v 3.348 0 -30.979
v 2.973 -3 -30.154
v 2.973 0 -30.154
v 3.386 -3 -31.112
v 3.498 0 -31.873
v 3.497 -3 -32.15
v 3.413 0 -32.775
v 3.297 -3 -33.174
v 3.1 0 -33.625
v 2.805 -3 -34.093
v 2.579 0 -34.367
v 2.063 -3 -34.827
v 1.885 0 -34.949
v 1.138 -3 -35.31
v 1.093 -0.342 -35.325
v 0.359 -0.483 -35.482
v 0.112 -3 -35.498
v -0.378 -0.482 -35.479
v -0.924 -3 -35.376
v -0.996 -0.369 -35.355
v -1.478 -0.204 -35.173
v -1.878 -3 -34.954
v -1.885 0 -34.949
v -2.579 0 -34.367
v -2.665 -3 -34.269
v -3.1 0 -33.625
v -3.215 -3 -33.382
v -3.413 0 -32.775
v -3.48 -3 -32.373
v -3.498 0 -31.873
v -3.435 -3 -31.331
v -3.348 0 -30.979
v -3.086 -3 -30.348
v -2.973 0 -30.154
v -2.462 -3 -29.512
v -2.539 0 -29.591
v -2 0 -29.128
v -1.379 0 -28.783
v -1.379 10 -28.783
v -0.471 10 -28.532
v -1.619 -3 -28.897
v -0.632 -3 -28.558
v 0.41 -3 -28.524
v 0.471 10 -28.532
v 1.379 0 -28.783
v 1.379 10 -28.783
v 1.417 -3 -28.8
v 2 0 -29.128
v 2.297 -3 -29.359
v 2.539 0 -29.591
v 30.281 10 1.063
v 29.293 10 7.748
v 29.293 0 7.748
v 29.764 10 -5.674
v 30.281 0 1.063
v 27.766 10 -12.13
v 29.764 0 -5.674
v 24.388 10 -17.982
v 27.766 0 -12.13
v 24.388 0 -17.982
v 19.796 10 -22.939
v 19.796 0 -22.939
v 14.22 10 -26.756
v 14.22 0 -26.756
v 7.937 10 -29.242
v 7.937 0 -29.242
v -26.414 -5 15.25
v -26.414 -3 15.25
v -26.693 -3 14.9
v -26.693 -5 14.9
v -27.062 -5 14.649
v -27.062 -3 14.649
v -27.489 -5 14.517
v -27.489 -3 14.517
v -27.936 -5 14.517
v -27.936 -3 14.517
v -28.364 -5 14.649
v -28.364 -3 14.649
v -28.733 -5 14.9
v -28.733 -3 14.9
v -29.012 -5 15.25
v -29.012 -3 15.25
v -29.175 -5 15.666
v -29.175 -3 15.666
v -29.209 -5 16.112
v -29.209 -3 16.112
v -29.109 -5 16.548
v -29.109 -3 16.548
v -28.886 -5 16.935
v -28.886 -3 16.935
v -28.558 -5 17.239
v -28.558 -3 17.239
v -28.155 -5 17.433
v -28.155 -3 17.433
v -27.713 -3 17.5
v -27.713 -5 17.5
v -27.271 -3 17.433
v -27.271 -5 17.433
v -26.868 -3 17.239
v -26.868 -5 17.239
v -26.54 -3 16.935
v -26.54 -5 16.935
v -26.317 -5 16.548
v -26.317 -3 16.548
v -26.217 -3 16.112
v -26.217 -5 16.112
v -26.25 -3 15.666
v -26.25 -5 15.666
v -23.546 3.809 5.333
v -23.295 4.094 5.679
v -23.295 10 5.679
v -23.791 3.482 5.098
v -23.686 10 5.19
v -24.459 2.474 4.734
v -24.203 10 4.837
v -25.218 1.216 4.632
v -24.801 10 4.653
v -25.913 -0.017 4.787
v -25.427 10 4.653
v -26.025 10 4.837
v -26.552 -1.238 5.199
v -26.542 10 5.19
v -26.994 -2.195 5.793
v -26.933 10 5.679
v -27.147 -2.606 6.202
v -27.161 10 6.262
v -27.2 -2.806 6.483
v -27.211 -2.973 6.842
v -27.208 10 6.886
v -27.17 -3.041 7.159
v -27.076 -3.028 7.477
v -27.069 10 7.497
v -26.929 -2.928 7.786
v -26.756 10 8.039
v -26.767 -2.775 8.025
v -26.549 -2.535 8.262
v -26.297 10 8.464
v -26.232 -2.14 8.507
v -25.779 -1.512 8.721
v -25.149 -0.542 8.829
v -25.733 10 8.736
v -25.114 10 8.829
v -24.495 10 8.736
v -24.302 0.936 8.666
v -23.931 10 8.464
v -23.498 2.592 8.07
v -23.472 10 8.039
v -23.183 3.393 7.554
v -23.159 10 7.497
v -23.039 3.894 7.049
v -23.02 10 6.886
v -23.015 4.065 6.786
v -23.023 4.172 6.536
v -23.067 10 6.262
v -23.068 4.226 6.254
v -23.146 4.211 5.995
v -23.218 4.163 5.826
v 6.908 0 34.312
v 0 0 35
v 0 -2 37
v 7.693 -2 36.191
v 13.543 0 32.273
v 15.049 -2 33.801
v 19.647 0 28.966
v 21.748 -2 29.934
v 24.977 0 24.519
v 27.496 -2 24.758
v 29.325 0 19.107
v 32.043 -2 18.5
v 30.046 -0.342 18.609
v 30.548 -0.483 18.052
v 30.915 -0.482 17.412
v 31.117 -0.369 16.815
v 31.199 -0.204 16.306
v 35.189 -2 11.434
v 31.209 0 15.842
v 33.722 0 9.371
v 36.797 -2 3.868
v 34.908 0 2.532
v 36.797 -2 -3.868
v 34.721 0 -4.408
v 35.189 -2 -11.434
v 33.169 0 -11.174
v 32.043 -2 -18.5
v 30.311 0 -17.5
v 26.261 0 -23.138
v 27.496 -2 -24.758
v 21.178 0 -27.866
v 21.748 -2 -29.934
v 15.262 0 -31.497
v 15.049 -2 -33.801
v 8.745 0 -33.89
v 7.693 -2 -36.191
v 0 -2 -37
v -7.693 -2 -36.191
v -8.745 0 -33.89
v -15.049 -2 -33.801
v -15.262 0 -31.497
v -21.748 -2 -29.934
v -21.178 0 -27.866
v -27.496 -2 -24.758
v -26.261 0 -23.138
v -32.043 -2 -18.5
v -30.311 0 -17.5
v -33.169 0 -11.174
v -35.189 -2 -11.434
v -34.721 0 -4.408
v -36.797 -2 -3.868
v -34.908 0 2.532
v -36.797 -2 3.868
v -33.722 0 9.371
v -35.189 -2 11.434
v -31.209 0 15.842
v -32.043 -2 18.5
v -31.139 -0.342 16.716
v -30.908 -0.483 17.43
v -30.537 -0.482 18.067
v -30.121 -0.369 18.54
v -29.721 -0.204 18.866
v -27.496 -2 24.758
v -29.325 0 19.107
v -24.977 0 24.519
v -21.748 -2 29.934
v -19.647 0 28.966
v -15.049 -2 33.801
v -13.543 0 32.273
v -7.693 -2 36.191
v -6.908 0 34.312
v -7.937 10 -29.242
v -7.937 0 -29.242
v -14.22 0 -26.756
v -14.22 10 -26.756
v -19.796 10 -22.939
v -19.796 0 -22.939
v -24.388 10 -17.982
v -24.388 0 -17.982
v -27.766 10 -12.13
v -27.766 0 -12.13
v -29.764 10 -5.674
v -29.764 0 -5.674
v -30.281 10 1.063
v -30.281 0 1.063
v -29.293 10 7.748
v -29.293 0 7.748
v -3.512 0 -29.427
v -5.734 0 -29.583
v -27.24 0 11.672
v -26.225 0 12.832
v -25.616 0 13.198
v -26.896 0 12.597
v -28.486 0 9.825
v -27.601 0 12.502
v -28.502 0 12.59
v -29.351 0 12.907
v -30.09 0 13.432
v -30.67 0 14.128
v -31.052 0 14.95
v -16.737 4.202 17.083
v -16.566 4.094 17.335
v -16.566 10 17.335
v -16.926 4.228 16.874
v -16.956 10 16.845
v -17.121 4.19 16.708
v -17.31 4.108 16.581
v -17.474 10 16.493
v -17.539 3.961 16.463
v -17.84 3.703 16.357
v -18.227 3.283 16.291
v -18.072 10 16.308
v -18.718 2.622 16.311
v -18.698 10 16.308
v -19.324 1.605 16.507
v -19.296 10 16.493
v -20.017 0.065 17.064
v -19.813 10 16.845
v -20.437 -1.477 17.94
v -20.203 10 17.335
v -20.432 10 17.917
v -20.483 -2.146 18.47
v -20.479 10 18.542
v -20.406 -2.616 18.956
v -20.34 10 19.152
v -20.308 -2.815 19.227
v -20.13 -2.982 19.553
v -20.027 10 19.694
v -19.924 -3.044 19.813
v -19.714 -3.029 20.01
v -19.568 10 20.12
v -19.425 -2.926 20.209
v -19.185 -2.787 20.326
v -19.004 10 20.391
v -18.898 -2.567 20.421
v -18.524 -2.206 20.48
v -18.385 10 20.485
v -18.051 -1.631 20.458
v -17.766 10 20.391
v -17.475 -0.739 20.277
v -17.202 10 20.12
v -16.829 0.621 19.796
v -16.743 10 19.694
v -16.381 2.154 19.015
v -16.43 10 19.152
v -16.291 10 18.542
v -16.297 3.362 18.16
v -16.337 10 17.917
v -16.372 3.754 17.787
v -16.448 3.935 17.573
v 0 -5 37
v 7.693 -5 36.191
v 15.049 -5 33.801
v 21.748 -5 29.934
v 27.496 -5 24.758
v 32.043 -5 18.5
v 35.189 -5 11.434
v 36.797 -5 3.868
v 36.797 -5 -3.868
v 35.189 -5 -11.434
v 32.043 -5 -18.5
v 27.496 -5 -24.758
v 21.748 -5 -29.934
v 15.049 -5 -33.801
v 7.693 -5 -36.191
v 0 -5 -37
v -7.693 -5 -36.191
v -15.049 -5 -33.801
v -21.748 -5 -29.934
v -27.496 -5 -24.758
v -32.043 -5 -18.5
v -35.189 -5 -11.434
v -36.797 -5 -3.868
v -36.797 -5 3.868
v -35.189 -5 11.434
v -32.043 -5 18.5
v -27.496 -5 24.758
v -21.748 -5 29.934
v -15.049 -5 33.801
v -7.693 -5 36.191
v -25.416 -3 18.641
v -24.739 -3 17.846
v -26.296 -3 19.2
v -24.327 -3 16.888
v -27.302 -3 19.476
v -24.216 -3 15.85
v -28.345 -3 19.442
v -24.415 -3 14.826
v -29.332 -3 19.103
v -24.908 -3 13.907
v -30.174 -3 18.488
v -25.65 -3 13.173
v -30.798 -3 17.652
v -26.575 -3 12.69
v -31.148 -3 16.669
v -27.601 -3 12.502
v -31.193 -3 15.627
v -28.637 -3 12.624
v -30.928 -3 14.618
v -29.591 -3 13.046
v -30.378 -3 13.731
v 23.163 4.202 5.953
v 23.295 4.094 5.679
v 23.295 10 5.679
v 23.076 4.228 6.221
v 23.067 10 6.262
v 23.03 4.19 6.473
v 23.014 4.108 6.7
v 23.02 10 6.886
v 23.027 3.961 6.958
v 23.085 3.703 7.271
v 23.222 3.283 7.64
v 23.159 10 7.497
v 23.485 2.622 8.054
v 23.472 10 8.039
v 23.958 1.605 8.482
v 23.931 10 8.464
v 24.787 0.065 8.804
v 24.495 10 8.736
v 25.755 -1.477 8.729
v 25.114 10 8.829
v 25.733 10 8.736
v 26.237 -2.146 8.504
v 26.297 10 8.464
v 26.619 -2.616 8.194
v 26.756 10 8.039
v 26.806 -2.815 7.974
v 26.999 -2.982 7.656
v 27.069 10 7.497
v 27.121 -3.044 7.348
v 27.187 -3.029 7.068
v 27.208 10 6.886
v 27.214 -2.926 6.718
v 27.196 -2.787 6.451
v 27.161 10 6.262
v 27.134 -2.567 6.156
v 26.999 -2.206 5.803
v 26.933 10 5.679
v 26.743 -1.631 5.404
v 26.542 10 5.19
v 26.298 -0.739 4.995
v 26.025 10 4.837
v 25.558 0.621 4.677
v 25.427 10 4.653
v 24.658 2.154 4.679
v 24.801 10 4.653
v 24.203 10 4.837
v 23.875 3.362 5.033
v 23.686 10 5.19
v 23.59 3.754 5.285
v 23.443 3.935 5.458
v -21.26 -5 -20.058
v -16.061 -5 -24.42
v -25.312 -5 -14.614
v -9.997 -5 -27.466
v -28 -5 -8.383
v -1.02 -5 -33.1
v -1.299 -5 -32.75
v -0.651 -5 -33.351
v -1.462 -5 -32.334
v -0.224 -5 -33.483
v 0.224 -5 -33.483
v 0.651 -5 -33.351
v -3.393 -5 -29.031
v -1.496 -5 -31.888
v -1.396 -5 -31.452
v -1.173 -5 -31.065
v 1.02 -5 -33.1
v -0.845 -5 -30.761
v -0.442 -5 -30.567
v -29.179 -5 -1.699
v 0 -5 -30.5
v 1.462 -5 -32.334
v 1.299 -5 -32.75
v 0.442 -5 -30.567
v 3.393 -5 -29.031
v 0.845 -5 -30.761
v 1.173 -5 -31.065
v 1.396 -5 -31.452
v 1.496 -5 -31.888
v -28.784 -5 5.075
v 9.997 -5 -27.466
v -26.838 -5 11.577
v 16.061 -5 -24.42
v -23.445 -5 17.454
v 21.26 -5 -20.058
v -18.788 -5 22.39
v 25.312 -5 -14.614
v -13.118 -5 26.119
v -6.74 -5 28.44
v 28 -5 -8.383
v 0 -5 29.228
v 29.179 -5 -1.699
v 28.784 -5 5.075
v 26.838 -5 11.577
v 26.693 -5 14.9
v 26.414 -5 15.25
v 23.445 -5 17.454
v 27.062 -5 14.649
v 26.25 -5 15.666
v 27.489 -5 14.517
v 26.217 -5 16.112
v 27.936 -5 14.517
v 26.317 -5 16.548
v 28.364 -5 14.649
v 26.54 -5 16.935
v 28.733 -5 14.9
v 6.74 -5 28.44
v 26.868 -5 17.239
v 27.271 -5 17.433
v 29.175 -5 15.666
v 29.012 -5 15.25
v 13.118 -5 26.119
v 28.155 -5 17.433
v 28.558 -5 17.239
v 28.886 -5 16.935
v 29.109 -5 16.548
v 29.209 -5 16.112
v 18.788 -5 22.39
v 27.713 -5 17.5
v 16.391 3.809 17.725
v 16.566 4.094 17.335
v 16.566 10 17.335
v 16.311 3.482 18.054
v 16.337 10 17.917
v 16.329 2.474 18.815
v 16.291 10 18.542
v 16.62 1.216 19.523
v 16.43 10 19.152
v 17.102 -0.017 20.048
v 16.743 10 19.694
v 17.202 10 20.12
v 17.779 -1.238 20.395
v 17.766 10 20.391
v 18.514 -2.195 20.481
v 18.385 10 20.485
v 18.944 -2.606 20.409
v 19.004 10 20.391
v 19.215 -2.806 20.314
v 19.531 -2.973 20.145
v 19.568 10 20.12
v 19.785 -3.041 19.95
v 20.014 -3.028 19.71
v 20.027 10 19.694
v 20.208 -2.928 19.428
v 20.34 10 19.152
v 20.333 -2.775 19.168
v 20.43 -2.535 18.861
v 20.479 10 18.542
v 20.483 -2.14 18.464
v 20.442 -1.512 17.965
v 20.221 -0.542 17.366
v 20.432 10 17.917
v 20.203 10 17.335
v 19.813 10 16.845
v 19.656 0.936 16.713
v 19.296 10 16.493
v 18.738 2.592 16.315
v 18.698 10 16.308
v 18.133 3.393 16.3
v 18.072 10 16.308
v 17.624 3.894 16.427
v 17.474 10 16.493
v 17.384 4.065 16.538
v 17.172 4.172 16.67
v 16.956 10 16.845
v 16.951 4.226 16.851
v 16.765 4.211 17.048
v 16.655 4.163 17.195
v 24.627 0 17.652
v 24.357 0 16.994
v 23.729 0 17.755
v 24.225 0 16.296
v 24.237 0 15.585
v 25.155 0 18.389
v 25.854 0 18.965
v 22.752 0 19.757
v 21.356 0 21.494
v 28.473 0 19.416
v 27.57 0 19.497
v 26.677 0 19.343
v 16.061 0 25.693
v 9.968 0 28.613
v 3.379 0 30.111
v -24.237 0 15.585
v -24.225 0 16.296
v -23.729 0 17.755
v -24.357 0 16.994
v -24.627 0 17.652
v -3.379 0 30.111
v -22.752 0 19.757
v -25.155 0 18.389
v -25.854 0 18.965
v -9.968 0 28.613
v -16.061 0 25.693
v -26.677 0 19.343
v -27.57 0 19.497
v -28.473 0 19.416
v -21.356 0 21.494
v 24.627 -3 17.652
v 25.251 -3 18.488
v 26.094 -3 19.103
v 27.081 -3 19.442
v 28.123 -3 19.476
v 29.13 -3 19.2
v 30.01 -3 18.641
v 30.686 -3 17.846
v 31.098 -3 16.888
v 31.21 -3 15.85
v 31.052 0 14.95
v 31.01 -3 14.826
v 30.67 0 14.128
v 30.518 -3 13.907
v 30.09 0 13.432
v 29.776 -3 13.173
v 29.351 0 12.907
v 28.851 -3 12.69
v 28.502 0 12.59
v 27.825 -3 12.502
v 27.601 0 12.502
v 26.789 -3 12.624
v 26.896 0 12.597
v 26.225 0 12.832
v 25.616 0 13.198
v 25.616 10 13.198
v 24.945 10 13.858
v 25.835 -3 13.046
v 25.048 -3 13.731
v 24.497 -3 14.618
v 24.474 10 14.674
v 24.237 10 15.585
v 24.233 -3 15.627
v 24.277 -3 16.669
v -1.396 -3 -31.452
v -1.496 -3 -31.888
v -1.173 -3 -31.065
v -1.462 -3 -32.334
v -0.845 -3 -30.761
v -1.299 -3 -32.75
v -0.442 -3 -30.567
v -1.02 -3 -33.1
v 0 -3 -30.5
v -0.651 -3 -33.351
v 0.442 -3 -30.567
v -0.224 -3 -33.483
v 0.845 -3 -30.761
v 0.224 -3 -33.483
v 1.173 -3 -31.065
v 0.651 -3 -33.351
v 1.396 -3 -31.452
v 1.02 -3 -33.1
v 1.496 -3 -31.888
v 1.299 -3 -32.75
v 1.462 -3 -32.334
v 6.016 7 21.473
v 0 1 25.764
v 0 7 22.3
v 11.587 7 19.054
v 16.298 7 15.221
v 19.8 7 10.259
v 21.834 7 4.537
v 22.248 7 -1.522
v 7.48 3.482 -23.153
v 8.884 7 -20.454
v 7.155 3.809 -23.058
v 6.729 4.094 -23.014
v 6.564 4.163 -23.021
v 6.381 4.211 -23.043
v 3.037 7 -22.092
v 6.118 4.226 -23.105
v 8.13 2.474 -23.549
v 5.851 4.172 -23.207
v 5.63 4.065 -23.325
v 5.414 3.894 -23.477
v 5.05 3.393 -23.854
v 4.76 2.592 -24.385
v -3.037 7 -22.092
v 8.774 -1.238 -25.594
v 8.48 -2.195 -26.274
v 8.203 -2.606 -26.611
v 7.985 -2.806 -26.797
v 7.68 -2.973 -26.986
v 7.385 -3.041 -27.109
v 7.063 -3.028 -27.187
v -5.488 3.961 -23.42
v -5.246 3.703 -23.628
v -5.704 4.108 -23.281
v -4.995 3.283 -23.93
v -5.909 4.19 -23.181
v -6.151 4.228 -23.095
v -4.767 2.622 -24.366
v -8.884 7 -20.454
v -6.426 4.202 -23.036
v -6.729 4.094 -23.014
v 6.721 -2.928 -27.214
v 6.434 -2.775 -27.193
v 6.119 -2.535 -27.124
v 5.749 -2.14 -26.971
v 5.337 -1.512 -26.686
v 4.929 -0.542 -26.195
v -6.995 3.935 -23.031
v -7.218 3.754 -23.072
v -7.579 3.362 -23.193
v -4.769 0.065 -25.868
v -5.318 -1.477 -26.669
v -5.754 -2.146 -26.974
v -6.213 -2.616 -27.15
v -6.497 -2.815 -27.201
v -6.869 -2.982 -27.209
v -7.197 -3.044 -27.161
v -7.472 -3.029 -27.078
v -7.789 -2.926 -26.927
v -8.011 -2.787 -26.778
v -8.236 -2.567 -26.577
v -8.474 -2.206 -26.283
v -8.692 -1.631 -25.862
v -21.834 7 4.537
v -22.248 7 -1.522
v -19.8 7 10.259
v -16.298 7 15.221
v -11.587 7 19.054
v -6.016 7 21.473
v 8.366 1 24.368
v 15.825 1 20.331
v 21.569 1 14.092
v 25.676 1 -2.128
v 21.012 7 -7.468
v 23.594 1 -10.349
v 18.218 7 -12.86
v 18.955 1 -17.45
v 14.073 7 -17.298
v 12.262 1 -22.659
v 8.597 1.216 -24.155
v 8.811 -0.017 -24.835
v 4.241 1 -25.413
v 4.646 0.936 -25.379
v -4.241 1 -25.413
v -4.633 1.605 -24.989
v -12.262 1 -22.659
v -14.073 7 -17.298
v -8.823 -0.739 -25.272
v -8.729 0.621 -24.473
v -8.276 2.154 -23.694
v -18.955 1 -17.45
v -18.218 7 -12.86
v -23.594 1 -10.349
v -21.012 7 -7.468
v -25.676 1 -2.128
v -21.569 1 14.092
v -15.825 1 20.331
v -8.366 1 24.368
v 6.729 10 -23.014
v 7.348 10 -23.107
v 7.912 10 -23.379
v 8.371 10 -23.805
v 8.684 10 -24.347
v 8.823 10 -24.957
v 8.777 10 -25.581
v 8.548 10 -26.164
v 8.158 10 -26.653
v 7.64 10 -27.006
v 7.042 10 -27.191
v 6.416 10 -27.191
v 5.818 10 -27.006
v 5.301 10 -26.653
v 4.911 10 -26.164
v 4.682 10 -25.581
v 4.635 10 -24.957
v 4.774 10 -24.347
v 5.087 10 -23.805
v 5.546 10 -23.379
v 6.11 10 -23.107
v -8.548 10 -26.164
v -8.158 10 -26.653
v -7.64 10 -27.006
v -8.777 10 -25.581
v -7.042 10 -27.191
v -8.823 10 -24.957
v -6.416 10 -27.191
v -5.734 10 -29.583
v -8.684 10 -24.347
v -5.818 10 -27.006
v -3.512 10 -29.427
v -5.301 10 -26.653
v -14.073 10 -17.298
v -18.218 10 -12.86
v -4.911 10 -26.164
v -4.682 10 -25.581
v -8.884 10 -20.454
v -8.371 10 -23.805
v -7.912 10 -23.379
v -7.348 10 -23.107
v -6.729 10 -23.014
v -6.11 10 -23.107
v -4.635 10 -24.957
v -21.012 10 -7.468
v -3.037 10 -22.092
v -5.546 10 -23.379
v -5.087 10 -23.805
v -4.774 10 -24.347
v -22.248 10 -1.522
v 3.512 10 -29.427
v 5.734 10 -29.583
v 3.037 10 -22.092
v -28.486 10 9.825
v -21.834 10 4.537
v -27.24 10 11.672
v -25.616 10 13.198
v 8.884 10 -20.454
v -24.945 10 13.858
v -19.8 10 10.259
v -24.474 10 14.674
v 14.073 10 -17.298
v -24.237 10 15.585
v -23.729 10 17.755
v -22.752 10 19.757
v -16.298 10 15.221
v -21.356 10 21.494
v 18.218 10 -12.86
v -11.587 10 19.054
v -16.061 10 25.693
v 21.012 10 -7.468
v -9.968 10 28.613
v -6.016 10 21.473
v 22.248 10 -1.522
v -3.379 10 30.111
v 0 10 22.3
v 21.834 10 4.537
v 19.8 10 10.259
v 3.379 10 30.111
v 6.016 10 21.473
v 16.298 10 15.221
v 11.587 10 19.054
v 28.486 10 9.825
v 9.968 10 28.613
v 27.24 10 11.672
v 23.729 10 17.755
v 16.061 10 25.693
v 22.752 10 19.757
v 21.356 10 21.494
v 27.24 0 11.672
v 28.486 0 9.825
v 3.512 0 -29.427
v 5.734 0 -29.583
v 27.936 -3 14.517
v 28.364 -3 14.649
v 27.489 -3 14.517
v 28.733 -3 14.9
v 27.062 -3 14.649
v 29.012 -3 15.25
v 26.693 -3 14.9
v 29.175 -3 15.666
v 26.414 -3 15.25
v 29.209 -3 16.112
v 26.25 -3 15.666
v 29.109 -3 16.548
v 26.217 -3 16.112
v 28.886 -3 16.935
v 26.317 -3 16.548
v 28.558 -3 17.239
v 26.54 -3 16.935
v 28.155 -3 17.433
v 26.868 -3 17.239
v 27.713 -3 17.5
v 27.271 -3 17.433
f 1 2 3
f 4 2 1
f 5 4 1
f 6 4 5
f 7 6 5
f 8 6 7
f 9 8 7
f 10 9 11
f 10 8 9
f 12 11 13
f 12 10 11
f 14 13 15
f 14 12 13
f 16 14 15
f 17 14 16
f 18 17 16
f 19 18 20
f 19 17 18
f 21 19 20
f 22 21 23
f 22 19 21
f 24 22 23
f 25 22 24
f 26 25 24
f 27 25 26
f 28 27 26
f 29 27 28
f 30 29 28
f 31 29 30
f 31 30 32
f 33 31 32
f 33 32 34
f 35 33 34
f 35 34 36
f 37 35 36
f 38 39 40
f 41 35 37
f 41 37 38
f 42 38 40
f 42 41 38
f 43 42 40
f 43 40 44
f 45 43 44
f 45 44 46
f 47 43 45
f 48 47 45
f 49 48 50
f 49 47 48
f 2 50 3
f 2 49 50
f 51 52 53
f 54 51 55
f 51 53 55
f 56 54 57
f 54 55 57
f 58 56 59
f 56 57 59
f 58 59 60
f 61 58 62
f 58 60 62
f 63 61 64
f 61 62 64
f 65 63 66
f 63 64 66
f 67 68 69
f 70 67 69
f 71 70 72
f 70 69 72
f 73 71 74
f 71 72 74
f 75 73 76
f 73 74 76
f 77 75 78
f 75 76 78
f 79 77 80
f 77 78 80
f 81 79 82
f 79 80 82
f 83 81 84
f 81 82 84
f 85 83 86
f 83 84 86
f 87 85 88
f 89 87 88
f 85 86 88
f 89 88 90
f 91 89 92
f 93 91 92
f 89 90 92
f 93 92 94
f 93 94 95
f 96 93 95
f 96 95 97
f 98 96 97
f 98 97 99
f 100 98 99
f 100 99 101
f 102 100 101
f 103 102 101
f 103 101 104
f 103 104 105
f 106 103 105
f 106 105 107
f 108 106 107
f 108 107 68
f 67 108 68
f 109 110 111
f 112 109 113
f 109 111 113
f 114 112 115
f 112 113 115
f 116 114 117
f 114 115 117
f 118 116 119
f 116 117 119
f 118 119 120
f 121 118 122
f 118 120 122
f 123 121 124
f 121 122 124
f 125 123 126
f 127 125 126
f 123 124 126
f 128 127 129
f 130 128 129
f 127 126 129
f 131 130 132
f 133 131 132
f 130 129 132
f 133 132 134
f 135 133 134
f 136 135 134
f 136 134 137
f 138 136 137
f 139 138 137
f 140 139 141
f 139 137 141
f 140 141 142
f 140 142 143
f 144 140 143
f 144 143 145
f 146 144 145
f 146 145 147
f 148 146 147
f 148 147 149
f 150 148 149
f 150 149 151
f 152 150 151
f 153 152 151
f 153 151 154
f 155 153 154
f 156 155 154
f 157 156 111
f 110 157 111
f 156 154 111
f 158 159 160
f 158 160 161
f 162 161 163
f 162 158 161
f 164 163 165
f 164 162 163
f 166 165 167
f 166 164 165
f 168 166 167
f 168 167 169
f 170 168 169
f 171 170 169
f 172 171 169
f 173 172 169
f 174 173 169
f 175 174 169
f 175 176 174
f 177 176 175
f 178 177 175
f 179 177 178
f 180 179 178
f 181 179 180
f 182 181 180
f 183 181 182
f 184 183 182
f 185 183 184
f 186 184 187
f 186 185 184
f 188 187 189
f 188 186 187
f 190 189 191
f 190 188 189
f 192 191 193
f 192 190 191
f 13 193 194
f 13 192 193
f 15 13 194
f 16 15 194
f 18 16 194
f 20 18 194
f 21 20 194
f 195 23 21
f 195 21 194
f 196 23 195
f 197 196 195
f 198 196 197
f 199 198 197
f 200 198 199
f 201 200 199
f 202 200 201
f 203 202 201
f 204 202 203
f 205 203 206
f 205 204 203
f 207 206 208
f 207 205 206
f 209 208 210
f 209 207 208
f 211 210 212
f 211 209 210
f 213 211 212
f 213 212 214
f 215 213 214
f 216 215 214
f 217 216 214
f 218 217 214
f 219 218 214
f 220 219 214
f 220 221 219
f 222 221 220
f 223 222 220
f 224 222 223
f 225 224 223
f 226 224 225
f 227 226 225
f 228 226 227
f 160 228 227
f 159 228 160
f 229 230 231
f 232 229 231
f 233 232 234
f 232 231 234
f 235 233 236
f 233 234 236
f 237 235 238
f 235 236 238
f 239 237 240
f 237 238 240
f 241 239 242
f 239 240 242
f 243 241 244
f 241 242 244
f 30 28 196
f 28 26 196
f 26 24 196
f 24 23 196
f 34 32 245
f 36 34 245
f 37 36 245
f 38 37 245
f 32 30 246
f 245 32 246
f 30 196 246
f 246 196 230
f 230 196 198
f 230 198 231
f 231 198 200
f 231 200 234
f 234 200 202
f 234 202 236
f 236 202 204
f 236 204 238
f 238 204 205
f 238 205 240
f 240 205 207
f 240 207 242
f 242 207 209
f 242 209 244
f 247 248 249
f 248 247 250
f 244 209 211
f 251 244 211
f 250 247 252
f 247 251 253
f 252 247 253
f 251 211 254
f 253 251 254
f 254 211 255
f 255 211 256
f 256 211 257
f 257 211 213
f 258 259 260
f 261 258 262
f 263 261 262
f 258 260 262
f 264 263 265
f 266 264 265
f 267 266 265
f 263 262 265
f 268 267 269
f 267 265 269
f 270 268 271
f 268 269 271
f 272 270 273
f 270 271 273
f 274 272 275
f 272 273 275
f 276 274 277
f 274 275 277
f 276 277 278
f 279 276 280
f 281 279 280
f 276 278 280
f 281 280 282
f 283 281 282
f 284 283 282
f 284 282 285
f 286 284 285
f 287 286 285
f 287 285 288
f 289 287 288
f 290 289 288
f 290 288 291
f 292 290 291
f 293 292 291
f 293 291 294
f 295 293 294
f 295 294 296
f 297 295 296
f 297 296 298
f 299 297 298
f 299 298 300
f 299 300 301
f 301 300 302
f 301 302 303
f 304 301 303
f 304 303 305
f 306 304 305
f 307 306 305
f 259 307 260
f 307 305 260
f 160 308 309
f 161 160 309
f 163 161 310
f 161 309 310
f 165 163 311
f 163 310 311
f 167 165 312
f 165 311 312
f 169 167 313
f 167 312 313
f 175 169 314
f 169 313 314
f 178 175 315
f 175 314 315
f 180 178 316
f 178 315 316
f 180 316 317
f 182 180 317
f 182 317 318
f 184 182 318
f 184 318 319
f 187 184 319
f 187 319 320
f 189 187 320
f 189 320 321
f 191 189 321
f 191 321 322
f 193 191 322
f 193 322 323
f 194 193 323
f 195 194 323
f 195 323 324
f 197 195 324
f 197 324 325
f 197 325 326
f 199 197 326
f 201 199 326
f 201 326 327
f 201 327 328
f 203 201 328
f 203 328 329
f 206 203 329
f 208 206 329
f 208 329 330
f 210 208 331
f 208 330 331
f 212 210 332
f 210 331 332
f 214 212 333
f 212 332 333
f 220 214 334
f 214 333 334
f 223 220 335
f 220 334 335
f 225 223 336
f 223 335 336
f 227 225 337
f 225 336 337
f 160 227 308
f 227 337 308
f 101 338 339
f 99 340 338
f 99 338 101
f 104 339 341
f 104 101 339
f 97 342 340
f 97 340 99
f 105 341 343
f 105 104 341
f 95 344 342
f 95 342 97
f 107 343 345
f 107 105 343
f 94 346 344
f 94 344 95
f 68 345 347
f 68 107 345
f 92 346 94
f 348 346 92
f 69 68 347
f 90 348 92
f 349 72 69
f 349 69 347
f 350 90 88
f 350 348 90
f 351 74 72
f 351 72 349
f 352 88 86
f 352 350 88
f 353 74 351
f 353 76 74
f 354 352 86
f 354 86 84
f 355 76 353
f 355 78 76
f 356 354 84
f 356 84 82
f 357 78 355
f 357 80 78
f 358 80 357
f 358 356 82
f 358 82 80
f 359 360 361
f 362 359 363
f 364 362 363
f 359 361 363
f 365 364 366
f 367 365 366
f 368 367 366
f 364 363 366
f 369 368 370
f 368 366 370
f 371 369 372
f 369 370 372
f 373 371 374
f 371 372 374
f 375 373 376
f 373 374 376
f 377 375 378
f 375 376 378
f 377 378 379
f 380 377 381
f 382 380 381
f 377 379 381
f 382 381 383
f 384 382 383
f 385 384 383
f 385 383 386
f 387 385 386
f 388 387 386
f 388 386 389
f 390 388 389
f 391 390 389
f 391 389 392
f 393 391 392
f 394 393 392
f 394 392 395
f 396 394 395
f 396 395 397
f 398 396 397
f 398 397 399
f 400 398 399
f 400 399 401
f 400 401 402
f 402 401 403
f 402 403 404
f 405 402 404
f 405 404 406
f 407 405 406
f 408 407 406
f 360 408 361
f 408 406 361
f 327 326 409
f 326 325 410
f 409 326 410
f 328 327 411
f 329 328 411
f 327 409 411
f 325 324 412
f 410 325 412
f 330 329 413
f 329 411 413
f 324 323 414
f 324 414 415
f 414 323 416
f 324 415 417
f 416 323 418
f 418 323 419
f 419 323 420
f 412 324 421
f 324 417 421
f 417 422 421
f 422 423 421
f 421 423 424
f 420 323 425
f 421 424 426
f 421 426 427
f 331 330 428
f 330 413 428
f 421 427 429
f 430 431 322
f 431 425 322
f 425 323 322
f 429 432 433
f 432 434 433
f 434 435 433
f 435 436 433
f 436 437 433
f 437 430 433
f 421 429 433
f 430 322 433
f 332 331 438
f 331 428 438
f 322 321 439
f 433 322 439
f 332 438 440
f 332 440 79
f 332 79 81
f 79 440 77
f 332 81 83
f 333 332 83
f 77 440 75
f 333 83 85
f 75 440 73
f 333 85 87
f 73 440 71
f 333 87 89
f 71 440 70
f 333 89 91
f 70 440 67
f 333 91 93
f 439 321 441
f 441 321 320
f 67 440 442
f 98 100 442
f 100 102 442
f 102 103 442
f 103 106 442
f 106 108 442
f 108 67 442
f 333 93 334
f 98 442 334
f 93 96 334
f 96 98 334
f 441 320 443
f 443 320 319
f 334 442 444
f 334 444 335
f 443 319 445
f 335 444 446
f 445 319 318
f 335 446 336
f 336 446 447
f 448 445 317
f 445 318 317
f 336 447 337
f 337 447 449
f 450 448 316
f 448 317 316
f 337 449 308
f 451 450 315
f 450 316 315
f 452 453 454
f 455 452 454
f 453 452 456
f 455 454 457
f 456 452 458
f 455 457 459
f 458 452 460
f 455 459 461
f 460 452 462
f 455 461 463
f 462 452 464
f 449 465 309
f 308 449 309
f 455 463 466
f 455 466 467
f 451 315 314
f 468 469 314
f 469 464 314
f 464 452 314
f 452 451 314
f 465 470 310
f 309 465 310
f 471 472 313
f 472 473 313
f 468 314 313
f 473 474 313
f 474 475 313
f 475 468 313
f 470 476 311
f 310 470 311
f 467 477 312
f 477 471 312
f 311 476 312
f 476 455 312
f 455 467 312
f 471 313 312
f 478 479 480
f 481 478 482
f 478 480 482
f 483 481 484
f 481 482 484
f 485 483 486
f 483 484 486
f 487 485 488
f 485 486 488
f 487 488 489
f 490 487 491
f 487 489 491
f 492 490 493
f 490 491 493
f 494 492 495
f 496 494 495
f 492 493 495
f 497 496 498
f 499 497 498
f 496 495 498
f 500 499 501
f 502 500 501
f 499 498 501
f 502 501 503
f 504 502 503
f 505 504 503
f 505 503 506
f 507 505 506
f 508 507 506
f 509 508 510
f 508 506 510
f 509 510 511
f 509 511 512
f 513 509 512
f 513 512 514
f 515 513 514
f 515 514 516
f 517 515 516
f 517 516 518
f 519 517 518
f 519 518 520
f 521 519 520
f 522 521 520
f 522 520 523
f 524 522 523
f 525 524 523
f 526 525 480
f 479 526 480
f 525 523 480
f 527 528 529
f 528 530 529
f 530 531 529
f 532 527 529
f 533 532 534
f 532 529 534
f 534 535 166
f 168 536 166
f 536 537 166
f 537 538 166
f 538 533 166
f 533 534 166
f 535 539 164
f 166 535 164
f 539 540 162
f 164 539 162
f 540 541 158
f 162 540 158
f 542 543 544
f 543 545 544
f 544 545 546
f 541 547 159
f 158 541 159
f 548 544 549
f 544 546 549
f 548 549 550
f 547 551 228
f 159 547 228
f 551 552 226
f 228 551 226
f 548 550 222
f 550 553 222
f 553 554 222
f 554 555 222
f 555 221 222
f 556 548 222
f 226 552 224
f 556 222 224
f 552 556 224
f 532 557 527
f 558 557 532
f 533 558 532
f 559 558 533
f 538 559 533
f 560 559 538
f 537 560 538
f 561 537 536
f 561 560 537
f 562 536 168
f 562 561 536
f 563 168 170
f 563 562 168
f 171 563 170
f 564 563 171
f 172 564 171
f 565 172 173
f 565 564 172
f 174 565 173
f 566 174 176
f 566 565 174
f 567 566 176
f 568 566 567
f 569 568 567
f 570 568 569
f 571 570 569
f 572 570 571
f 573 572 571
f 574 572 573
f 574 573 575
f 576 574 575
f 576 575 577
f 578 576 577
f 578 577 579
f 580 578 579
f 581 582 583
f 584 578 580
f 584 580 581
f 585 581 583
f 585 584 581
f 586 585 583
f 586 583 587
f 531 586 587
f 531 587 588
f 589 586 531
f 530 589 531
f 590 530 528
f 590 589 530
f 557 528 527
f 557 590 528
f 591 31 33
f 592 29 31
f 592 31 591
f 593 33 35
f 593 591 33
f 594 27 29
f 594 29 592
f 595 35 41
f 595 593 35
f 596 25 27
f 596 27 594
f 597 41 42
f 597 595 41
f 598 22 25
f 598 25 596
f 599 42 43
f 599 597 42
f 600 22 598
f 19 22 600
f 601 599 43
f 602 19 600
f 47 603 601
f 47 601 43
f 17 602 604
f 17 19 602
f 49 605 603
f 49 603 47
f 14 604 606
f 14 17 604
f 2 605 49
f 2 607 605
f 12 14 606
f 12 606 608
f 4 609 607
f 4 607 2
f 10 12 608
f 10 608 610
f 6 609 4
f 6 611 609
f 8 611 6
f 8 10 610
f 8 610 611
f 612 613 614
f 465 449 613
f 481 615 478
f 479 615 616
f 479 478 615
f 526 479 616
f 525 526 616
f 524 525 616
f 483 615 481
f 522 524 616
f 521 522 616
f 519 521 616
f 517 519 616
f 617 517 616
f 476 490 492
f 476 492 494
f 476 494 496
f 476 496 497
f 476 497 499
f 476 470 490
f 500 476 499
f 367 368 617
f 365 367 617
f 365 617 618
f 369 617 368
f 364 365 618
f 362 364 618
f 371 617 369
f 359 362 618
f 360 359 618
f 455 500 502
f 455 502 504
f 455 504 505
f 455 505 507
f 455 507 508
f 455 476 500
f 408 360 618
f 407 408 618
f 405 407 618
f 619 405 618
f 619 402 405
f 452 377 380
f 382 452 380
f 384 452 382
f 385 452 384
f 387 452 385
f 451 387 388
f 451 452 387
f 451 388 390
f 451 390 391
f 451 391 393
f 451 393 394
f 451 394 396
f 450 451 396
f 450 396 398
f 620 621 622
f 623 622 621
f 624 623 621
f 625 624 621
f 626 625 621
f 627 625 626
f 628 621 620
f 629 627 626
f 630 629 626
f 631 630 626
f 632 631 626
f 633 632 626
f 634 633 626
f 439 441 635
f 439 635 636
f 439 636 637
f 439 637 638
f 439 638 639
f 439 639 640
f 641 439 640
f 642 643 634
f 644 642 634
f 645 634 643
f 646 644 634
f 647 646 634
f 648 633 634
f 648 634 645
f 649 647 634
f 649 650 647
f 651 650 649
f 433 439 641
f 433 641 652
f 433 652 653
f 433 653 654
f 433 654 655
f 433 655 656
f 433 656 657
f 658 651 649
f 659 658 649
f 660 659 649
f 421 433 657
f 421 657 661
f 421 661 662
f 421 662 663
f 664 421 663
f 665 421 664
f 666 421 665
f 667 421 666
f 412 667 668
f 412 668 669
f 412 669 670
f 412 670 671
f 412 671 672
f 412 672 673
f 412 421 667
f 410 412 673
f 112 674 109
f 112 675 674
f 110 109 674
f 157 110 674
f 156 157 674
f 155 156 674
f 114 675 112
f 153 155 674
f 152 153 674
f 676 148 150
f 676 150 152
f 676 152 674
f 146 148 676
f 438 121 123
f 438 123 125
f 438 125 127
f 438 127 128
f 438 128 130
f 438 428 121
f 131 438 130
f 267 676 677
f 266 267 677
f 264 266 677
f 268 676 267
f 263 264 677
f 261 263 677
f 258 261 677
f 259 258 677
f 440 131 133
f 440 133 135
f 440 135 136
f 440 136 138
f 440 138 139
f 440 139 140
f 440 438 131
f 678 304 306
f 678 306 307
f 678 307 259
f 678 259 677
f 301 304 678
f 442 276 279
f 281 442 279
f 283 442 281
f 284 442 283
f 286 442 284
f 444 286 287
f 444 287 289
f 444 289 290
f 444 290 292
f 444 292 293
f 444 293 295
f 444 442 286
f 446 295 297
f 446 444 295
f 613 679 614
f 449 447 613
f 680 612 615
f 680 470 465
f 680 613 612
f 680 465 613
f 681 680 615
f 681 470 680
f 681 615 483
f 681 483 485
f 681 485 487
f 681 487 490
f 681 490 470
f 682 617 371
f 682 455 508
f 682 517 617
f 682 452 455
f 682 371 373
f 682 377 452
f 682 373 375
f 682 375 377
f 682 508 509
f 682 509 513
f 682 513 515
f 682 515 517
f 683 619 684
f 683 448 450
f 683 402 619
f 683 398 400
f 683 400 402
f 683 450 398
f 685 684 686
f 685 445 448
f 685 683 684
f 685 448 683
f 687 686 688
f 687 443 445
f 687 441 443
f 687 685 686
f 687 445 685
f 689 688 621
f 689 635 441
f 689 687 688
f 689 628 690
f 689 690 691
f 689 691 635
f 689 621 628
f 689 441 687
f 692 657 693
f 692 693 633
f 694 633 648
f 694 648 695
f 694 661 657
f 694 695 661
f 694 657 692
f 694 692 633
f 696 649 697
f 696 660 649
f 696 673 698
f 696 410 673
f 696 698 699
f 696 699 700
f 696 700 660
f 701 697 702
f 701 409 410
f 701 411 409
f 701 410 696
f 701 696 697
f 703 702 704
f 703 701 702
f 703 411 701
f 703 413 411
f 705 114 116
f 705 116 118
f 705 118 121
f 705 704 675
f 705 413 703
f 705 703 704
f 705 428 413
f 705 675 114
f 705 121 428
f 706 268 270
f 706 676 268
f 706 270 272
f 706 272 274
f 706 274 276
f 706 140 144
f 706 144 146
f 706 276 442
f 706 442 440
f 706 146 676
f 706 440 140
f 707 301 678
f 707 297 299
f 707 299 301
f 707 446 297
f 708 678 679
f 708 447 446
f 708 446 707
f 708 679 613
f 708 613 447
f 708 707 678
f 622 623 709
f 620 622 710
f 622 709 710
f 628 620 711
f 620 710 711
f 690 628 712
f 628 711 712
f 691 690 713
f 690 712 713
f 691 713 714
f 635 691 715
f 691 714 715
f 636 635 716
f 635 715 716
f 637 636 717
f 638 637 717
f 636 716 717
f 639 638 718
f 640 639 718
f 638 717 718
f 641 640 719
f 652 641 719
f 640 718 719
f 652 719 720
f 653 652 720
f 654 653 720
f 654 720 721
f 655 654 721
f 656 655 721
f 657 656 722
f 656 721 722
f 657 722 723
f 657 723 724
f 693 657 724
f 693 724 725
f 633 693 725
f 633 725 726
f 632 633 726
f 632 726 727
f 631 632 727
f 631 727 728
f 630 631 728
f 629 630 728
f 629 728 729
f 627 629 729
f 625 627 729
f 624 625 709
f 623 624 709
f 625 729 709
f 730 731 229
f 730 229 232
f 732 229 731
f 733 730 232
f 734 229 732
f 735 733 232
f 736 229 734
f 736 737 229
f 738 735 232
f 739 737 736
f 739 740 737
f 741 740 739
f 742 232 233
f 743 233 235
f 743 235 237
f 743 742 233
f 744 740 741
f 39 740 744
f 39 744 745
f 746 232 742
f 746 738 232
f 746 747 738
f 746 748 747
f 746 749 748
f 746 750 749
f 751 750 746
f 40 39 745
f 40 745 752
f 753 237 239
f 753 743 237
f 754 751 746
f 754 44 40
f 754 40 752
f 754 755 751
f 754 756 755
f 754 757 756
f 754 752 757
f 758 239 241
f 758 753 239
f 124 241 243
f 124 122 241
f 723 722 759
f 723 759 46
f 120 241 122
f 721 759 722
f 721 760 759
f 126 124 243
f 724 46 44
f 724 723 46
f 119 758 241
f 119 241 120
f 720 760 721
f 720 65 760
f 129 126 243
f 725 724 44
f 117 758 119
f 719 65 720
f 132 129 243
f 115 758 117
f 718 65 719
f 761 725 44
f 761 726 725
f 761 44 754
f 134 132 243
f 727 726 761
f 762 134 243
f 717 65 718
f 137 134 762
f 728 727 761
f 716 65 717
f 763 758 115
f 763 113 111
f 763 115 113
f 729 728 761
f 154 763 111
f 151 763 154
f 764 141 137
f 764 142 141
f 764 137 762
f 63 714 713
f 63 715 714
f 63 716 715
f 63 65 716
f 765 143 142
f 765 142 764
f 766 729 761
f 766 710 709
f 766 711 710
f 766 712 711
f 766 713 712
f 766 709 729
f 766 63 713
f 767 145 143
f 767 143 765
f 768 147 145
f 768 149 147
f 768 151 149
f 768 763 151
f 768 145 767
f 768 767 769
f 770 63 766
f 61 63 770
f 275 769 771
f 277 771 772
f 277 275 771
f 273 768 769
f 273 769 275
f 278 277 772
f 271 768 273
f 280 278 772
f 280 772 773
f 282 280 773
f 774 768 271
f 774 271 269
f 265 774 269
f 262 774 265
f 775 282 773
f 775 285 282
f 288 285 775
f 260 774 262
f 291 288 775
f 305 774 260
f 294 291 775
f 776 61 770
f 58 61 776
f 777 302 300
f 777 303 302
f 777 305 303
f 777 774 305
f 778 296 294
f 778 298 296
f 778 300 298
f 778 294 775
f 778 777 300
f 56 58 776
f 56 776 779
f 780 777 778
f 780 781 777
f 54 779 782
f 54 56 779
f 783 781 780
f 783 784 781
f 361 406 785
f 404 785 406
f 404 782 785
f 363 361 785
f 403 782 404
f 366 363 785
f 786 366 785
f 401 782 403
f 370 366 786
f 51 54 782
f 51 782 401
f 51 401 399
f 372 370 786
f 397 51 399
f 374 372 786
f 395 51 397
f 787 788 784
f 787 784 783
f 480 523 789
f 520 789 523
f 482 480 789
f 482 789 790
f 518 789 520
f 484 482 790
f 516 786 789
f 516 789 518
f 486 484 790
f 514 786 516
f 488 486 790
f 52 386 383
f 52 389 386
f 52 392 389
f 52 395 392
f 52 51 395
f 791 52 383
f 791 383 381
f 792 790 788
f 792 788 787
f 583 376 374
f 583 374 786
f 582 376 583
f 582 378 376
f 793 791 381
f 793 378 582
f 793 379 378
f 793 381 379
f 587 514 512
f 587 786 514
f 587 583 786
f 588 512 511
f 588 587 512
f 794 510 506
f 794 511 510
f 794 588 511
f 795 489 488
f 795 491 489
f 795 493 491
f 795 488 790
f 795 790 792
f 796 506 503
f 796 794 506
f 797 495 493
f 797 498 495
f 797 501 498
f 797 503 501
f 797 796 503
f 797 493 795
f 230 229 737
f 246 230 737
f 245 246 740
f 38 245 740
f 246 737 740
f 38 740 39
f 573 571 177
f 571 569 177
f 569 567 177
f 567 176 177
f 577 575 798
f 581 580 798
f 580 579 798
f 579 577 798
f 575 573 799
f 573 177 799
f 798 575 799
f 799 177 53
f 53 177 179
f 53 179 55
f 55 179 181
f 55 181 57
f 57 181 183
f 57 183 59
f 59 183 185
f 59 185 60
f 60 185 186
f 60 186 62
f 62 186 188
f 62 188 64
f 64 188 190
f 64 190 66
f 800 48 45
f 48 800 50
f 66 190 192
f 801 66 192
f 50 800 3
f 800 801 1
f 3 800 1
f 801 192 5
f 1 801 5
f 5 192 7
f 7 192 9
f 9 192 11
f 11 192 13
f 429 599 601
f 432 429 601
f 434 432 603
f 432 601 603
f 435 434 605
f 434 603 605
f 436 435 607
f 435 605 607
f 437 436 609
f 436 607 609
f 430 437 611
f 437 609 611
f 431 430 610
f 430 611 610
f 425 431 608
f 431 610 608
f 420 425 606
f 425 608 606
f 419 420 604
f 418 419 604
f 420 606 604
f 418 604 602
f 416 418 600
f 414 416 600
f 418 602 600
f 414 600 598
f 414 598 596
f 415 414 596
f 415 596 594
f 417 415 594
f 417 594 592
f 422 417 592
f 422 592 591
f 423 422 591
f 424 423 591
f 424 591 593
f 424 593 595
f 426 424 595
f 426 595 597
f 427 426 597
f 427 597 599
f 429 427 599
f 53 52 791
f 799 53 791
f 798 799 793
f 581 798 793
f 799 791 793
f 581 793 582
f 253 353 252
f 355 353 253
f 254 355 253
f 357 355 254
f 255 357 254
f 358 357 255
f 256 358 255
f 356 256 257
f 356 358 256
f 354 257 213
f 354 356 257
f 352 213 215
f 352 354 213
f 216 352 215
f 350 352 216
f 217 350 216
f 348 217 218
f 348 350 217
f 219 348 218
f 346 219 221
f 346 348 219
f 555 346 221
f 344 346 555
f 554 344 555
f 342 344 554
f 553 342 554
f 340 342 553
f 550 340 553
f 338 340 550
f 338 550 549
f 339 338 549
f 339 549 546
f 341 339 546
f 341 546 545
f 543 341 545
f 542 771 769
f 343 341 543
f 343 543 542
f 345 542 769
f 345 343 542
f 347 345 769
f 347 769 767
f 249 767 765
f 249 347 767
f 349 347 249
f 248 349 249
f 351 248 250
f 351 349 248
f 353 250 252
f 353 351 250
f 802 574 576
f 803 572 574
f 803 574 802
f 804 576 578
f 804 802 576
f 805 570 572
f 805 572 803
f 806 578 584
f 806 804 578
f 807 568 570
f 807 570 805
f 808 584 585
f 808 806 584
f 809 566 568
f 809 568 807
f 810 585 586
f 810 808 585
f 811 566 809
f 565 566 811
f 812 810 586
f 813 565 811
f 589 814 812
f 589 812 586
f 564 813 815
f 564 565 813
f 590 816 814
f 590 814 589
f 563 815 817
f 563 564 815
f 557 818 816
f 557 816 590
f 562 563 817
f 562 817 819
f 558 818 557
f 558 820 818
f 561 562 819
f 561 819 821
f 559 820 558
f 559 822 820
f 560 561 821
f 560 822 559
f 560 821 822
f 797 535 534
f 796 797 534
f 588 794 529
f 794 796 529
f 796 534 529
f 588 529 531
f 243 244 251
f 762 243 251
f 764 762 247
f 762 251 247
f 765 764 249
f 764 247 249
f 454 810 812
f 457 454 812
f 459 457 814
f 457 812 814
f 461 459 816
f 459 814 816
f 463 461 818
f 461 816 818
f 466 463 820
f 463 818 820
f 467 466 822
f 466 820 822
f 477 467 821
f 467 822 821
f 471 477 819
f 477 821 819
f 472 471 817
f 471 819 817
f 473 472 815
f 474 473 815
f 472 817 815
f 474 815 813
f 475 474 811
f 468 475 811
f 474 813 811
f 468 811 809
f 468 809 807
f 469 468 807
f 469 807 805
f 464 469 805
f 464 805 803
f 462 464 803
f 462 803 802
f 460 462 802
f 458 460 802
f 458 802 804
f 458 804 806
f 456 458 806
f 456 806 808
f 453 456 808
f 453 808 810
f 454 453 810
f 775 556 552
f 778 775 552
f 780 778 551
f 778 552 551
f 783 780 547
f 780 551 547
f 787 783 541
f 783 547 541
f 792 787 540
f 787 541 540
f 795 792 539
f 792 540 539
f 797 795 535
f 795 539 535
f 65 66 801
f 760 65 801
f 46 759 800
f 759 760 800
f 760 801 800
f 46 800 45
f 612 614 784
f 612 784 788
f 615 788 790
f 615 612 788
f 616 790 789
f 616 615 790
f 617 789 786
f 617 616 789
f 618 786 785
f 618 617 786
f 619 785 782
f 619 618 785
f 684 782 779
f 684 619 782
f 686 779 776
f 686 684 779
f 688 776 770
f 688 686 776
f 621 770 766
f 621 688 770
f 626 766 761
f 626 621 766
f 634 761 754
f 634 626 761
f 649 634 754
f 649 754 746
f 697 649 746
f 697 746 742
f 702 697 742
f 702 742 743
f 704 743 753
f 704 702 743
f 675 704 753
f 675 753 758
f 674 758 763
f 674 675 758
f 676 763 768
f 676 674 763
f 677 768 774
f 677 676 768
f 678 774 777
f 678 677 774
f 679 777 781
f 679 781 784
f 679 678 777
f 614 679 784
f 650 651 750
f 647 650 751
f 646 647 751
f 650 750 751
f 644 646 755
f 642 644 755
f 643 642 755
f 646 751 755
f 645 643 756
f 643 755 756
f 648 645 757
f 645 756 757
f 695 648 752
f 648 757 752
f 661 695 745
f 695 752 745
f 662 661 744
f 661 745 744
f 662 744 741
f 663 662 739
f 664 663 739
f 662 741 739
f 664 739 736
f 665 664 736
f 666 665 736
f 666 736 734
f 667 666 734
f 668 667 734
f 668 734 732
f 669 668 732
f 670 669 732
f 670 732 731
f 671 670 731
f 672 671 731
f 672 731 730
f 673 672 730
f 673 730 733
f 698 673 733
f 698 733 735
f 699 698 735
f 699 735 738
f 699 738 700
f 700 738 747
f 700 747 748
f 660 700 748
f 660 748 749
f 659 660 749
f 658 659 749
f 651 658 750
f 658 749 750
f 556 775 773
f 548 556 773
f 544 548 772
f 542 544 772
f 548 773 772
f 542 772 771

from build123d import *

# Parameters (mm, degrees)
SKETCH1_R           = 30.3
SKETCH1_R_2         = 22.3
BOSS_EXTRUDE1_DEPTH = 10
BOSS_EXTRUDE2_START = -5
SKETCH2_R           = 37
SKETCH2_R_2         = 22.3
BOSS_EXTRUDE2_DEPTH = 5
SKETCH3_R           = 1.5
CUT_EXTRUDE1_DEPTH  = 54.272882407
CUT_EXTRUDE2_START  = -3
SKETCH4_R           = 3.5
CUT_EXTRUDE2_DEPTH  = 57.272882407
CIRPATTERN1_COUNT   = 3
CHAMFER1_SIZE       = 12
CHAMFER1_SIZE2      = 6.92820323
CHAMFER2_SIZE       = 2
SKETCH5_R           = 2.1
CUT_EXTRUDE3_DEPTH  = 55.433445737
CIRPATTERN2_COUNT   = 3
FILLET1_R           = 10


with BuildPart() as part:
    # Sketch1 → Boss-Extrude1 (new body)
    with BuildSketch(Plane(origin=(0, 0, 0), x_dir=(1, 0, 0), z_dir=(0, 1, 0))):
        with Locations(Location((0, 0, 0), (0, 0, 270))):
            Circle(SKETCH1_R)
        with Locations(Location((0, 0, 0), (0, 0, 270))):
            Circle(SKETCH1_R_2, mode=Mode.SUBTRACT)
    extrude(amount=BOSS_EXTRUDE1_DEPTH)

    # Sketch2 → Boss-Extrude2 (add)
    with BuildSketch(Plane(origin=(0, 0, 0), x_dir=(1, 0, 0), z_dir=(0, 1, 0)).offset(BOSS_EXTRUDE2_START)):
        with Locations(Location((0, 0, 0), (0, 0, 270))):
            Circle(SKETCH2_R)
        with Locations(Location((0, 0, 0), (0, 0, 270))):
            Circle(SKETCH2_R_2, mode=Mode.SUBTRACT)
    extrude(amount=BOSS_EXTRUDE2_DEPTH)

    # Sketch3 → Cut-Extrude1 (cut, through all)
    with BuildSketch(Plane(origin=(0, 0, 0), x_dir=(1, 0, 0), z_dir=(0, 1, 0))):
        with Locations(Location((0, 32, 0), (0, 0, 270))):
            Circle(SKETCH3_R)
    cut_extrude1 = extrude(amount=-CUT_EXTRUDE1_DEPTH, mode=Mode.SUBTRACT)

    # Sketch4 → Cut-Extrude2 (cut)
    with BuildSketch(Plane(origin=(0, 0, 0), x_dir=(1, 0, 0), z_dir=(0, 1, 0)).offset(CUT_EXTRUDE2_START)):
        with Locations(Location((0, 32, 0), (0, 0, 328.163304996))):
            Circle(SKETCH4_R)
    cut_extrude2 = extrude(amount=CUT_EXTRUDE2_DEPTH, mode=Mode.SUBTRACT)

    # CirPattern1: Cut-Extrude1, Cut-Extrude2 ×3 about axis
    cirpattern1_axis = Axis((0, 0, 0), (0, 1, 0))
    add([cut_extrude1.rotate(cirpattern1_axis, i * 360 / CIRPATTERN1_COUNT) for i in range(1, CIRPATTERN1_COUNT)], mode=Mode.SUBTRACT)
    add([cut_extrude2.rotate(cirpattern1_axis, i * 360 / CIRPATTERN1_COUNT) for i in range(1, CIRPATTERN1_COUNT)], mode=Mode.SUBTRACT)

    # Chamfer1
    chamfer1_edges = [part.edges().sort_by_distance(p)[0] for p in [
        (0, -5, -22.3),
    ]]
    chamfer1_side = [part.faces().sort_by_distance(p)[0] for p in [
        (0, 2.5, -22.3),
    ]]
    chamfer(chamfer1_edges, length=CHAMFER1_SIZE, length2=CHAMFER1_SIZE2, reference=chamfer1_side[0])

    # Chamfer2
    # the kernel refuses this chamfer: 2 mm, written as the material it takes off along each edge
    with BuildSketch(Plane(origin=(0, 0, 0), x_dir=(0, 0, 1), z_dir=(-1, 0, 0))) as chamfer2_piece_1:
        Polygon((37, -CHAMFER2_SIZE), (37 - CHAMFER2_SIZE, 0), (37, 0), align=None)
    revolve(axis=Axis((0, 0, 0), (0, 1, 0)), mode=Mode.SUBTRACT)

    # Sketch5 → Cut-Extrude3 (cut, through all)
    with BuildSketch(Plane(origin=(0, 10, 0), x_dir=(1, 0, 0), z_dir=(0, 1, 0))):
        with Locations(Location((6.729295173, 25.114071484, 0), (0, 0, 270))):
            Circle(SKETCH5_R)
        with Locations(Location((-6.729295173, 25.114071484, 0), (0, 0, 270))):
            Circle(SKETCH5_R)
    cut_extrude3 = extrude(amount=-CUT_EXTRUDE3_DEPTH, mode=Mode.SUBTRACT)

    # CirPattern2: Cut-Extrude3 ×3 about axis
    cirpattern2_axis = Axis((0, 0, 0), (0, 1, 0))
    for i in range(1, CIRPATTERN2_COUNT):
        add(cut_extrude3.rotate(cirpattern2_axis, i * 360 / CIRPATTERN2_COUNT), mode=Mode.SUBTRACT)

    # Fillet1
    # the kernel refuses this fillet: 10 mm, written as the material it takes off along each edge
    with BuildSketch(Plane(origin=(2.973442607, 0, -30.15375), x_dir=(0.9835455418768547, 0, 0.18066036381609613), z_dir=(0, 1, 0)), Plane(origin=(-27.600634823, 0, 12.501798166), x_dir=(-0.33531630641674726, 0, -0.9421056069523365), z_dir=(0, 1, 0)), Plane(origin=(-24.627192216, 22.615356127, 17.651951834), x_dir=(0.6482292354635445, 0, 0.7614452431333121), z_dir=(0, -1, 0)), Plane(origin=(27.600634823, 22.615356127, 12.501798166), x_dir=(0.33531630641249444, 0, -0.9421056069538499), z_dir=(0, -1, 0))) as fillet1_piece_1:
        with BuildLine():
            CenterArc((4.213445677, -9.965270497), FILLET1_R, 85.223468089, 38.380201644)
            ThreePointArc((-1.321003282, -1.636412549), (-0.534685103, -0.919772386), (0, 0))
            ThreePointArc((0, 0), (2.523071225, 0.105230393), (5.046142451, 0))
        make_face()
    extrude(amount=22.615356127, mode=Mode.SUBTRACT)
    with BuildSketch(Plane(origin=(-2.973442607, 22.615356127, -30.15375), x_dir=(0.758369035624482, 0, 0.6518254412079917), z_dir=(0, -1, 0)), Plane(origin=(24.627192216, 0, 17.651951834), x_dir=(-0.18531287310344324, 0, -0.9826795708989514), z_dir=(0, 1, 0))) as fillet1_piece_2:
        with BuildLine():
            CenterArc((5.107451253, 9.538012489), FILLET1_R, 214.135867483, 38.380201644)
            ThreePointArc((-3.169640839, 3.926439938), (-1.66670095, 1.897121448), (0, 0))
            ThreePointArc((0, 0), (1.051534082, 0.161695629), (2.103068163, 0))
        make_face()
    extrude(amount=22.615356127, mode=Mode.SUBTRACT)


solid = part.part
